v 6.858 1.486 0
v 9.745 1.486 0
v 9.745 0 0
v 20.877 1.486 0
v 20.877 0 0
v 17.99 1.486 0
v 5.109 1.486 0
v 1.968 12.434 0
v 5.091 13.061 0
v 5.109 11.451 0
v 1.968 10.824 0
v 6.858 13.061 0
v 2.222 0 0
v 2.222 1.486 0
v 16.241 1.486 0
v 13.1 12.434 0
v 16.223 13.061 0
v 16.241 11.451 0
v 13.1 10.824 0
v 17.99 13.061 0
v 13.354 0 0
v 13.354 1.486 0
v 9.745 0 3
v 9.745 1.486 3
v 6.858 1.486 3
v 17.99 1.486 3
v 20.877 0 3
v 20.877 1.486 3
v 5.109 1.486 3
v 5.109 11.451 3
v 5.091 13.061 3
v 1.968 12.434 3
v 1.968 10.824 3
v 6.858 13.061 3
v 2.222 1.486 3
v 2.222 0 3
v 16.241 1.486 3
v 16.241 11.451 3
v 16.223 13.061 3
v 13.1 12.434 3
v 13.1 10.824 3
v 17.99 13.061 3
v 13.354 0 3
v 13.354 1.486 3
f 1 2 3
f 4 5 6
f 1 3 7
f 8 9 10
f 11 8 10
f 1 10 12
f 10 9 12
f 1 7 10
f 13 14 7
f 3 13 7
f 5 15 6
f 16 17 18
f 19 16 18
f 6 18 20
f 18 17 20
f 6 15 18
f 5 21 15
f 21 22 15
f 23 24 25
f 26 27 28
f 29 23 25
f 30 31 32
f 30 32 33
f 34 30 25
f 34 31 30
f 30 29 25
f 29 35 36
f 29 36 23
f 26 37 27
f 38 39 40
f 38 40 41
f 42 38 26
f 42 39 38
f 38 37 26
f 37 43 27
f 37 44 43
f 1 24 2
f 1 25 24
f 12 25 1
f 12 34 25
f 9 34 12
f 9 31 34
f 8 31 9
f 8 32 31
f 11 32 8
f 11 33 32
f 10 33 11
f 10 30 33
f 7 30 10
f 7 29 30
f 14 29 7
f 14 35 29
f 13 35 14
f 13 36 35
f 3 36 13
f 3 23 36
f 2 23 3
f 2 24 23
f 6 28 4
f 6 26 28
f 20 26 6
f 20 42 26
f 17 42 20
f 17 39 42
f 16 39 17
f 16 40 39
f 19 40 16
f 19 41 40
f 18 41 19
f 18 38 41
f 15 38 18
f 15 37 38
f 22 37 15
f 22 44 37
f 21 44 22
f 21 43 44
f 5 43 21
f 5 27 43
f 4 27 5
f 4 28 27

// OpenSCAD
// Number Declaration
Which_number_do_you_need = 11; //[1:12]
// Font Declaration
What_font = "Standard"; //	[Standard, Fjalla One, Roboto, Ubuntu, Lobster, Anton, Exo Bold, Patua One]


// Declare what size to use for each number
numSize =       (What_font == "Standard") ? 12.9 : 
                (What_font == "Fjalla One") ? 13.4 :
                (What_font == "Roboto") ? 12.9 :
                (What_font == "Ubuntu") ? 12.9 :
                (What_font == "Lobster") ? 13.9 :
                (What_font == "Anton") ? 13.9 :
                (What_font == "Exo Bold" ? 13.9 : 13.9);

//    text(Which_number_do_you_need, size = numSize, font = What_font);
    
    echo(Which_number_do_you_need);
    echo(What_font);
    echo(numSize);
    
if(Which_number_do_you_need==1) linear_extrude(height = 3){text("1", size = numSize, font = What_font);}
if(Which_number_do_you_need==2) linear_extrude(height = 3){text("2", size = numSize, font = What_font);}
if(Which_number_do_you_need==3) linear_extrude(height = 3){text("3", size = numSize, font = What_font);}
if(Which_number_do_you_need==4) linear_extrude(height = 3){text("4", size = numSize, font = What_font);}
if(Which_number_do_you_need==5) linear_extrude(height = 3){text("5", size = numSize, font = What_font);}
if(Which_number_do_you_need==6) linear_extrude(height = 3){text("6", size = numSize, font = What_font);}
if(Which_number_do_you_need==7) linear_extrude(height = 3){text("7", size = numSize, font = What_font);}
if(Which_number_do_you_need==8) linear_extrude(height = 3){text("8", size = numSize, font = What_font);}
if(Which_number_do_you_need==9) linear_extrude(height = 3){text("9", size = numSize, font = What_font);}
if(Which_number_do_you_need==10) linear_extrude(height = 3){text("10", size = numSize, font = What_font);}
if(Which_number_do_you_need==11) linear_extrude(height = 3){text("11", size = numSize, font = What_font);}
if(Which_number_do_you_need==12) linear_extrude(height = 3){text("12", size = numSize, font = What_font);}
